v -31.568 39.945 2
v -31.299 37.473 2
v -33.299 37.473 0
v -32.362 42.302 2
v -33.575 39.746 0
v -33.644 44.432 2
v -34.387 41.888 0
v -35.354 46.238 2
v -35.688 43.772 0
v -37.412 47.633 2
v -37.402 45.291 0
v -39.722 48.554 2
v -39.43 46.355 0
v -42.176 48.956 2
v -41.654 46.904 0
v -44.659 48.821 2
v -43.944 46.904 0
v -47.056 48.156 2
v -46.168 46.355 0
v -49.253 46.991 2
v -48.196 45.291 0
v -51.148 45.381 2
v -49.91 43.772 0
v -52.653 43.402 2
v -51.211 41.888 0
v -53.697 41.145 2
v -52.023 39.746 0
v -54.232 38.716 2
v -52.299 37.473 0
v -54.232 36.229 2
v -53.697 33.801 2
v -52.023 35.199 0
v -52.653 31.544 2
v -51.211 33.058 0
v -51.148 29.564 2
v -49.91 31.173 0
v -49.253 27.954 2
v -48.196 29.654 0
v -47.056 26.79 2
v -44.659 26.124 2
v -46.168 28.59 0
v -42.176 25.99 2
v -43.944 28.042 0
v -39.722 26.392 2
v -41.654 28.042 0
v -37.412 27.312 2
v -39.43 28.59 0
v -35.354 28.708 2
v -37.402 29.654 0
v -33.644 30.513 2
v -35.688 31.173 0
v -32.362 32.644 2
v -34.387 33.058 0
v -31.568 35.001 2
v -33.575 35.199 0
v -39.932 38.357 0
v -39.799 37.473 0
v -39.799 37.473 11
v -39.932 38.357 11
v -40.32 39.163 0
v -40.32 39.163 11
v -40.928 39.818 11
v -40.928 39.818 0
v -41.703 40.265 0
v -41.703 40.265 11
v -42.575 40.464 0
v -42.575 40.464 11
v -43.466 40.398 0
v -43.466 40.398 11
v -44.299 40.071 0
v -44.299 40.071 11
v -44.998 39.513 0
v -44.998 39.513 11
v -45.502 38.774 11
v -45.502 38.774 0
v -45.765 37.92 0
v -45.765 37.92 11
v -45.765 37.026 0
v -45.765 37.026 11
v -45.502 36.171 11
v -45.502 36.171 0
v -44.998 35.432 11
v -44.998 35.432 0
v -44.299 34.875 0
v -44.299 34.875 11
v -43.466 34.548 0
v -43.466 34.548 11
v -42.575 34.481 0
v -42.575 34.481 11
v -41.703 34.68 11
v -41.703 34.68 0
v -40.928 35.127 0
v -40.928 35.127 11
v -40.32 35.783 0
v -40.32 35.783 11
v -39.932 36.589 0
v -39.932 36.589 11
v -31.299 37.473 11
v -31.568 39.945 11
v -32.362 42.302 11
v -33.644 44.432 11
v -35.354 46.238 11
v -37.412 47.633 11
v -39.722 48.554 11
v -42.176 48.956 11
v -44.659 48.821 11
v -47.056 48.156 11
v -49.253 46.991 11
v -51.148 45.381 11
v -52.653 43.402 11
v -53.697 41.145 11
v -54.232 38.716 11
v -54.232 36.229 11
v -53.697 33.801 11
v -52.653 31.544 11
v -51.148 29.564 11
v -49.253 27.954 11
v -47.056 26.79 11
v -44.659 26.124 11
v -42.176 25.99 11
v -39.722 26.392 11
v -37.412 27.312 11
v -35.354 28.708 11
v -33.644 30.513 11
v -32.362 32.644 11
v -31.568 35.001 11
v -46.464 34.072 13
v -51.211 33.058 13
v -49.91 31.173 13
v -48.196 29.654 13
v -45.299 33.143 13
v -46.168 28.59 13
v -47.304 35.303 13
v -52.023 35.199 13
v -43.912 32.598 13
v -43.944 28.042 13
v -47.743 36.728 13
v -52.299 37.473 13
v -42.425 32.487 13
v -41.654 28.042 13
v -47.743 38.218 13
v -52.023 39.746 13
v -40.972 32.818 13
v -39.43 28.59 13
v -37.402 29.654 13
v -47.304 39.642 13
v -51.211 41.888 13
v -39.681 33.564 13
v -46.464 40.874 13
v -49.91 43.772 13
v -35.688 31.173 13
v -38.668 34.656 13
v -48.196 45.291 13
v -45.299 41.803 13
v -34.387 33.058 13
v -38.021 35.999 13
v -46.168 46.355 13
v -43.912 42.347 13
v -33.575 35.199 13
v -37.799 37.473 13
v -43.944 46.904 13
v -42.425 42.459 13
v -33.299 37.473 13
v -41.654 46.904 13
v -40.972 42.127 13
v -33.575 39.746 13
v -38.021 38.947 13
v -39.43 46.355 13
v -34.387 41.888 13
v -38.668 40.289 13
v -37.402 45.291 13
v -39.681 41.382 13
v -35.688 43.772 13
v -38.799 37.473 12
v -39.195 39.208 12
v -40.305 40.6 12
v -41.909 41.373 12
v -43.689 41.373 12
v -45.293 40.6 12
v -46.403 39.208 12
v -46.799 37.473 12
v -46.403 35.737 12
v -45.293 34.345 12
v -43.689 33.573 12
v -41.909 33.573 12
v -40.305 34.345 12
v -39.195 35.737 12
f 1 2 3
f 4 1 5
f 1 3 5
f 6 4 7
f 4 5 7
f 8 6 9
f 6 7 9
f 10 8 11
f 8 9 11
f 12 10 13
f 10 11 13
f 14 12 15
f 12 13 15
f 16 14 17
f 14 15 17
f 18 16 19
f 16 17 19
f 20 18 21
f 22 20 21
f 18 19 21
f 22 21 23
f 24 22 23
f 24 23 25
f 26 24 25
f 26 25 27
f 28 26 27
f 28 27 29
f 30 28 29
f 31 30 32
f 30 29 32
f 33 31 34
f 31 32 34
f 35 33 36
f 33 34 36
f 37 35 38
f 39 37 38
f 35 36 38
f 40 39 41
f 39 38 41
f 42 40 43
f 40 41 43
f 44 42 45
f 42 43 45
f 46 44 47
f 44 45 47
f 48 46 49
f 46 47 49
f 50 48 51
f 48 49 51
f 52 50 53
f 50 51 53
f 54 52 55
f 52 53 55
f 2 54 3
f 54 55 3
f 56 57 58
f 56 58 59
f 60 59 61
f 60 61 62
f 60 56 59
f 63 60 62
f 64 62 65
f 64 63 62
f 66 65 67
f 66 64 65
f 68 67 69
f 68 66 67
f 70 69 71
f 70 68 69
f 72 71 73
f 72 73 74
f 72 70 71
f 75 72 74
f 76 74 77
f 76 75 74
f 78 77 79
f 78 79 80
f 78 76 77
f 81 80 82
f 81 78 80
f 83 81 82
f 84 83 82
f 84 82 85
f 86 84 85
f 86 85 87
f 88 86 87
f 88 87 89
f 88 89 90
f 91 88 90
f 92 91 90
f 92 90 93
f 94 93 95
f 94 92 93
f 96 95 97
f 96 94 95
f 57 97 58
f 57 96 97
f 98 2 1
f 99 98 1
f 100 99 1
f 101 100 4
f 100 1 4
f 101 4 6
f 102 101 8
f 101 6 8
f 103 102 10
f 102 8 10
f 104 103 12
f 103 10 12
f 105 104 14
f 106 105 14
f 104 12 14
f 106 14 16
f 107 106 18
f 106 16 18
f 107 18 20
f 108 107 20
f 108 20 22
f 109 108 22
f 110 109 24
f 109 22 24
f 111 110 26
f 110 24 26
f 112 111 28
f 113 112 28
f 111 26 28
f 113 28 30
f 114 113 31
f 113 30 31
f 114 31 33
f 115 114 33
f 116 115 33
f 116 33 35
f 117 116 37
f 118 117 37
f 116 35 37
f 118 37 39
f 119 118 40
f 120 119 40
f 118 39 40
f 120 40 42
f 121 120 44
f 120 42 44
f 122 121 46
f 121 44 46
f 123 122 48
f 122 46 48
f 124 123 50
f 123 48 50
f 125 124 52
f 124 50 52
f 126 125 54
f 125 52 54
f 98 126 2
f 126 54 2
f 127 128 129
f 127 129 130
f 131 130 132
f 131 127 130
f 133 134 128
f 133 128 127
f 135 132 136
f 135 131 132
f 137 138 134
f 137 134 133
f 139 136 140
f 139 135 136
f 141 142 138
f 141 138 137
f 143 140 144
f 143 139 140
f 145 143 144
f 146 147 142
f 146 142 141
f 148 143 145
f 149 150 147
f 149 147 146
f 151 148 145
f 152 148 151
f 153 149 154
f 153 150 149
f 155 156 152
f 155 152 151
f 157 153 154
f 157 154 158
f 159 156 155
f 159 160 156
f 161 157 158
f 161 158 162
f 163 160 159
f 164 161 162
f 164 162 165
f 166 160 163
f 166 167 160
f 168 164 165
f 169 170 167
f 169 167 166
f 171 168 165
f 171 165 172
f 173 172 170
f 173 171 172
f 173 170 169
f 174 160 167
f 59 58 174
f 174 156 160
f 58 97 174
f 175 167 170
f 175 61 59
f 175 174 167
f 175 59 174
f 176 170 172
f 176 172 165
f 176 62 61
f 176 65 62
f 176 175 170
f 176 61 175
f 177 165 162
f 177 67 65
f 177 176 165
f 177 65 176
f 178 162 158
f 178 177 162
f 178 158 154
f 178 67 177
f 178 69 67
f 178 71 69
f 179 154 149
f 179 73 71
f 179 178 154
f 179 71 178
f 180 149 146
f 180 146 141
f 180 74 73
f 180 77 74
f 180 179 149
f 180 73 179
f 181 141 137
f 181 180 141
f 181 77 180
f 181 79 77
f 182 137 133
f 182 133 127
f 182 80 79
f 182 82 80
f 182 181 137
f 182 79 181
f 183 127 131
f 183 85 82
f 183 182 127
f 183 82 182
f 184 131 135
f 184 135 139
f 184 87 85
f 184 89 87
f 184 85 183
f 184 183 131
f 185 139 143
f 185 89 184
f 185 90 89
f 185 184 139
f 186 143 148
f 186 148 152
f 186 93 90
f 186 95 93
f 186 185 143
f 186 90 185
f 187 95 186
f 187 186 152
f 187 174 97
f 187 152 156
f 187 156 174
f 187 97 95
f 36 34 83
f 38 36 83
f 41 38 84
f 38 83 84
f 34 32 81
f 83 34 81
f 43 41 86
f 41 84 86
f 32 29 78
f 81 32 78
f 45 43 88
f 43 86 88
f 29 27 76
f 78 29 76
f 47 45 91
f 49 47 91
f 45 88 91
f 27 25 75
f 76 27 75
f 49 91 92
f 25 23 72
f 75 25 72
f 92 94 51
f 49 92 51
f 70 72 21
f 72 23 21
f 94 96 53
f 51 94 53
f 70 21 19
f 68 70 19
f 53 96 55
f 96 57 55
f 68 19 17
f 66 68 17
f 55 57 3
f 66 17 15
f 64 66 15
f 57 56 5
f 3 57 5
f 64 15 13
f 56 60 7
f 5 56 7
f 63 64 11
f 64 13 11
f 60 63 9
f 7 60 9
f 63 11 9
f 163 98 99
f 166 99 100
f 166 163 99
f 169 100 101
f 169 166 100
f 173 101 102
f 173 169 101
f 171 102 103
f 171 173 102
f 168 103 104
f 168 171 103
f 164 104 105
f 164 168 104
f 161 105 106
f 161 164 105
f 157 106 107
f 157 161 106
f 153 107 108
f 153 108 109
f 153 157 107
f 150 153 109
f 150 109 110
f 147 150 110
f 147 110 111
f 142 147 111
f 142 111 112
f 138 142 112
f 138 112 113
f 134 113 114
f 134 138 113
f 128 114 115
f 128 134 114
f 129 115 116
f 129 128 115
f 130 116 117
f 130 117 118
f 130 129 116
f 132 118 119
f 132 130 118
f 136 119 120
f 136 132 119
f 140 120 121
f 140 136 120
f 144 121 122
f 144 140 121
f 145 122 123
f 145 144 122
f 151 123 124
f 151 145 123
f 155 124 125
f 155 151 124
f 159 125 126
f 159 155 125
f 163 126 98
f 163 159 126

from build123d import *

# Parameters (mm, degrees)
F0_R     = 11.5
F0_R_2   = 3
F1_DEPTH = 13
F2_SIZE  = 2
F3_SIZE  = 2
F4_SIZE  = 2


with BuildPart() as f1:
    # F0 (on Top) → F1 (new body)
    with BuildSketch(Plane.XY):
        with Locations((-42.798914, 37.472825)):
            Circle(F0_R)
        with Locations((-42.798914, 37.472825)):
            Circle(F0_R_2, mode=Mode.SUBTRACT)
    extrude(amount=F1_DEPTH)

    # F2
    f2_edges = [f1.edges().sort_by_distance(p)[0] for p in [
        (-54.298914, 37.472825, 13),
    ]]
    chamfer(f2_edges, length=F2_SIZE)

    # F3
    f3_edges = [f1.edges().sort_by_distance(p)[0] for p in [
        (-54.298914, 37.472825, 0),
    ]]
    chamfer(f3_edges, length=F3_SIZE)

    # F4
    f4_edges = [f1.edges().sort_by_distance(p)[0] for p in [
        (-45.798914, 37.472825, 13),
    ]]
    chamfer(f4_edges, length=F4_SIZE)


solid = f1.part
